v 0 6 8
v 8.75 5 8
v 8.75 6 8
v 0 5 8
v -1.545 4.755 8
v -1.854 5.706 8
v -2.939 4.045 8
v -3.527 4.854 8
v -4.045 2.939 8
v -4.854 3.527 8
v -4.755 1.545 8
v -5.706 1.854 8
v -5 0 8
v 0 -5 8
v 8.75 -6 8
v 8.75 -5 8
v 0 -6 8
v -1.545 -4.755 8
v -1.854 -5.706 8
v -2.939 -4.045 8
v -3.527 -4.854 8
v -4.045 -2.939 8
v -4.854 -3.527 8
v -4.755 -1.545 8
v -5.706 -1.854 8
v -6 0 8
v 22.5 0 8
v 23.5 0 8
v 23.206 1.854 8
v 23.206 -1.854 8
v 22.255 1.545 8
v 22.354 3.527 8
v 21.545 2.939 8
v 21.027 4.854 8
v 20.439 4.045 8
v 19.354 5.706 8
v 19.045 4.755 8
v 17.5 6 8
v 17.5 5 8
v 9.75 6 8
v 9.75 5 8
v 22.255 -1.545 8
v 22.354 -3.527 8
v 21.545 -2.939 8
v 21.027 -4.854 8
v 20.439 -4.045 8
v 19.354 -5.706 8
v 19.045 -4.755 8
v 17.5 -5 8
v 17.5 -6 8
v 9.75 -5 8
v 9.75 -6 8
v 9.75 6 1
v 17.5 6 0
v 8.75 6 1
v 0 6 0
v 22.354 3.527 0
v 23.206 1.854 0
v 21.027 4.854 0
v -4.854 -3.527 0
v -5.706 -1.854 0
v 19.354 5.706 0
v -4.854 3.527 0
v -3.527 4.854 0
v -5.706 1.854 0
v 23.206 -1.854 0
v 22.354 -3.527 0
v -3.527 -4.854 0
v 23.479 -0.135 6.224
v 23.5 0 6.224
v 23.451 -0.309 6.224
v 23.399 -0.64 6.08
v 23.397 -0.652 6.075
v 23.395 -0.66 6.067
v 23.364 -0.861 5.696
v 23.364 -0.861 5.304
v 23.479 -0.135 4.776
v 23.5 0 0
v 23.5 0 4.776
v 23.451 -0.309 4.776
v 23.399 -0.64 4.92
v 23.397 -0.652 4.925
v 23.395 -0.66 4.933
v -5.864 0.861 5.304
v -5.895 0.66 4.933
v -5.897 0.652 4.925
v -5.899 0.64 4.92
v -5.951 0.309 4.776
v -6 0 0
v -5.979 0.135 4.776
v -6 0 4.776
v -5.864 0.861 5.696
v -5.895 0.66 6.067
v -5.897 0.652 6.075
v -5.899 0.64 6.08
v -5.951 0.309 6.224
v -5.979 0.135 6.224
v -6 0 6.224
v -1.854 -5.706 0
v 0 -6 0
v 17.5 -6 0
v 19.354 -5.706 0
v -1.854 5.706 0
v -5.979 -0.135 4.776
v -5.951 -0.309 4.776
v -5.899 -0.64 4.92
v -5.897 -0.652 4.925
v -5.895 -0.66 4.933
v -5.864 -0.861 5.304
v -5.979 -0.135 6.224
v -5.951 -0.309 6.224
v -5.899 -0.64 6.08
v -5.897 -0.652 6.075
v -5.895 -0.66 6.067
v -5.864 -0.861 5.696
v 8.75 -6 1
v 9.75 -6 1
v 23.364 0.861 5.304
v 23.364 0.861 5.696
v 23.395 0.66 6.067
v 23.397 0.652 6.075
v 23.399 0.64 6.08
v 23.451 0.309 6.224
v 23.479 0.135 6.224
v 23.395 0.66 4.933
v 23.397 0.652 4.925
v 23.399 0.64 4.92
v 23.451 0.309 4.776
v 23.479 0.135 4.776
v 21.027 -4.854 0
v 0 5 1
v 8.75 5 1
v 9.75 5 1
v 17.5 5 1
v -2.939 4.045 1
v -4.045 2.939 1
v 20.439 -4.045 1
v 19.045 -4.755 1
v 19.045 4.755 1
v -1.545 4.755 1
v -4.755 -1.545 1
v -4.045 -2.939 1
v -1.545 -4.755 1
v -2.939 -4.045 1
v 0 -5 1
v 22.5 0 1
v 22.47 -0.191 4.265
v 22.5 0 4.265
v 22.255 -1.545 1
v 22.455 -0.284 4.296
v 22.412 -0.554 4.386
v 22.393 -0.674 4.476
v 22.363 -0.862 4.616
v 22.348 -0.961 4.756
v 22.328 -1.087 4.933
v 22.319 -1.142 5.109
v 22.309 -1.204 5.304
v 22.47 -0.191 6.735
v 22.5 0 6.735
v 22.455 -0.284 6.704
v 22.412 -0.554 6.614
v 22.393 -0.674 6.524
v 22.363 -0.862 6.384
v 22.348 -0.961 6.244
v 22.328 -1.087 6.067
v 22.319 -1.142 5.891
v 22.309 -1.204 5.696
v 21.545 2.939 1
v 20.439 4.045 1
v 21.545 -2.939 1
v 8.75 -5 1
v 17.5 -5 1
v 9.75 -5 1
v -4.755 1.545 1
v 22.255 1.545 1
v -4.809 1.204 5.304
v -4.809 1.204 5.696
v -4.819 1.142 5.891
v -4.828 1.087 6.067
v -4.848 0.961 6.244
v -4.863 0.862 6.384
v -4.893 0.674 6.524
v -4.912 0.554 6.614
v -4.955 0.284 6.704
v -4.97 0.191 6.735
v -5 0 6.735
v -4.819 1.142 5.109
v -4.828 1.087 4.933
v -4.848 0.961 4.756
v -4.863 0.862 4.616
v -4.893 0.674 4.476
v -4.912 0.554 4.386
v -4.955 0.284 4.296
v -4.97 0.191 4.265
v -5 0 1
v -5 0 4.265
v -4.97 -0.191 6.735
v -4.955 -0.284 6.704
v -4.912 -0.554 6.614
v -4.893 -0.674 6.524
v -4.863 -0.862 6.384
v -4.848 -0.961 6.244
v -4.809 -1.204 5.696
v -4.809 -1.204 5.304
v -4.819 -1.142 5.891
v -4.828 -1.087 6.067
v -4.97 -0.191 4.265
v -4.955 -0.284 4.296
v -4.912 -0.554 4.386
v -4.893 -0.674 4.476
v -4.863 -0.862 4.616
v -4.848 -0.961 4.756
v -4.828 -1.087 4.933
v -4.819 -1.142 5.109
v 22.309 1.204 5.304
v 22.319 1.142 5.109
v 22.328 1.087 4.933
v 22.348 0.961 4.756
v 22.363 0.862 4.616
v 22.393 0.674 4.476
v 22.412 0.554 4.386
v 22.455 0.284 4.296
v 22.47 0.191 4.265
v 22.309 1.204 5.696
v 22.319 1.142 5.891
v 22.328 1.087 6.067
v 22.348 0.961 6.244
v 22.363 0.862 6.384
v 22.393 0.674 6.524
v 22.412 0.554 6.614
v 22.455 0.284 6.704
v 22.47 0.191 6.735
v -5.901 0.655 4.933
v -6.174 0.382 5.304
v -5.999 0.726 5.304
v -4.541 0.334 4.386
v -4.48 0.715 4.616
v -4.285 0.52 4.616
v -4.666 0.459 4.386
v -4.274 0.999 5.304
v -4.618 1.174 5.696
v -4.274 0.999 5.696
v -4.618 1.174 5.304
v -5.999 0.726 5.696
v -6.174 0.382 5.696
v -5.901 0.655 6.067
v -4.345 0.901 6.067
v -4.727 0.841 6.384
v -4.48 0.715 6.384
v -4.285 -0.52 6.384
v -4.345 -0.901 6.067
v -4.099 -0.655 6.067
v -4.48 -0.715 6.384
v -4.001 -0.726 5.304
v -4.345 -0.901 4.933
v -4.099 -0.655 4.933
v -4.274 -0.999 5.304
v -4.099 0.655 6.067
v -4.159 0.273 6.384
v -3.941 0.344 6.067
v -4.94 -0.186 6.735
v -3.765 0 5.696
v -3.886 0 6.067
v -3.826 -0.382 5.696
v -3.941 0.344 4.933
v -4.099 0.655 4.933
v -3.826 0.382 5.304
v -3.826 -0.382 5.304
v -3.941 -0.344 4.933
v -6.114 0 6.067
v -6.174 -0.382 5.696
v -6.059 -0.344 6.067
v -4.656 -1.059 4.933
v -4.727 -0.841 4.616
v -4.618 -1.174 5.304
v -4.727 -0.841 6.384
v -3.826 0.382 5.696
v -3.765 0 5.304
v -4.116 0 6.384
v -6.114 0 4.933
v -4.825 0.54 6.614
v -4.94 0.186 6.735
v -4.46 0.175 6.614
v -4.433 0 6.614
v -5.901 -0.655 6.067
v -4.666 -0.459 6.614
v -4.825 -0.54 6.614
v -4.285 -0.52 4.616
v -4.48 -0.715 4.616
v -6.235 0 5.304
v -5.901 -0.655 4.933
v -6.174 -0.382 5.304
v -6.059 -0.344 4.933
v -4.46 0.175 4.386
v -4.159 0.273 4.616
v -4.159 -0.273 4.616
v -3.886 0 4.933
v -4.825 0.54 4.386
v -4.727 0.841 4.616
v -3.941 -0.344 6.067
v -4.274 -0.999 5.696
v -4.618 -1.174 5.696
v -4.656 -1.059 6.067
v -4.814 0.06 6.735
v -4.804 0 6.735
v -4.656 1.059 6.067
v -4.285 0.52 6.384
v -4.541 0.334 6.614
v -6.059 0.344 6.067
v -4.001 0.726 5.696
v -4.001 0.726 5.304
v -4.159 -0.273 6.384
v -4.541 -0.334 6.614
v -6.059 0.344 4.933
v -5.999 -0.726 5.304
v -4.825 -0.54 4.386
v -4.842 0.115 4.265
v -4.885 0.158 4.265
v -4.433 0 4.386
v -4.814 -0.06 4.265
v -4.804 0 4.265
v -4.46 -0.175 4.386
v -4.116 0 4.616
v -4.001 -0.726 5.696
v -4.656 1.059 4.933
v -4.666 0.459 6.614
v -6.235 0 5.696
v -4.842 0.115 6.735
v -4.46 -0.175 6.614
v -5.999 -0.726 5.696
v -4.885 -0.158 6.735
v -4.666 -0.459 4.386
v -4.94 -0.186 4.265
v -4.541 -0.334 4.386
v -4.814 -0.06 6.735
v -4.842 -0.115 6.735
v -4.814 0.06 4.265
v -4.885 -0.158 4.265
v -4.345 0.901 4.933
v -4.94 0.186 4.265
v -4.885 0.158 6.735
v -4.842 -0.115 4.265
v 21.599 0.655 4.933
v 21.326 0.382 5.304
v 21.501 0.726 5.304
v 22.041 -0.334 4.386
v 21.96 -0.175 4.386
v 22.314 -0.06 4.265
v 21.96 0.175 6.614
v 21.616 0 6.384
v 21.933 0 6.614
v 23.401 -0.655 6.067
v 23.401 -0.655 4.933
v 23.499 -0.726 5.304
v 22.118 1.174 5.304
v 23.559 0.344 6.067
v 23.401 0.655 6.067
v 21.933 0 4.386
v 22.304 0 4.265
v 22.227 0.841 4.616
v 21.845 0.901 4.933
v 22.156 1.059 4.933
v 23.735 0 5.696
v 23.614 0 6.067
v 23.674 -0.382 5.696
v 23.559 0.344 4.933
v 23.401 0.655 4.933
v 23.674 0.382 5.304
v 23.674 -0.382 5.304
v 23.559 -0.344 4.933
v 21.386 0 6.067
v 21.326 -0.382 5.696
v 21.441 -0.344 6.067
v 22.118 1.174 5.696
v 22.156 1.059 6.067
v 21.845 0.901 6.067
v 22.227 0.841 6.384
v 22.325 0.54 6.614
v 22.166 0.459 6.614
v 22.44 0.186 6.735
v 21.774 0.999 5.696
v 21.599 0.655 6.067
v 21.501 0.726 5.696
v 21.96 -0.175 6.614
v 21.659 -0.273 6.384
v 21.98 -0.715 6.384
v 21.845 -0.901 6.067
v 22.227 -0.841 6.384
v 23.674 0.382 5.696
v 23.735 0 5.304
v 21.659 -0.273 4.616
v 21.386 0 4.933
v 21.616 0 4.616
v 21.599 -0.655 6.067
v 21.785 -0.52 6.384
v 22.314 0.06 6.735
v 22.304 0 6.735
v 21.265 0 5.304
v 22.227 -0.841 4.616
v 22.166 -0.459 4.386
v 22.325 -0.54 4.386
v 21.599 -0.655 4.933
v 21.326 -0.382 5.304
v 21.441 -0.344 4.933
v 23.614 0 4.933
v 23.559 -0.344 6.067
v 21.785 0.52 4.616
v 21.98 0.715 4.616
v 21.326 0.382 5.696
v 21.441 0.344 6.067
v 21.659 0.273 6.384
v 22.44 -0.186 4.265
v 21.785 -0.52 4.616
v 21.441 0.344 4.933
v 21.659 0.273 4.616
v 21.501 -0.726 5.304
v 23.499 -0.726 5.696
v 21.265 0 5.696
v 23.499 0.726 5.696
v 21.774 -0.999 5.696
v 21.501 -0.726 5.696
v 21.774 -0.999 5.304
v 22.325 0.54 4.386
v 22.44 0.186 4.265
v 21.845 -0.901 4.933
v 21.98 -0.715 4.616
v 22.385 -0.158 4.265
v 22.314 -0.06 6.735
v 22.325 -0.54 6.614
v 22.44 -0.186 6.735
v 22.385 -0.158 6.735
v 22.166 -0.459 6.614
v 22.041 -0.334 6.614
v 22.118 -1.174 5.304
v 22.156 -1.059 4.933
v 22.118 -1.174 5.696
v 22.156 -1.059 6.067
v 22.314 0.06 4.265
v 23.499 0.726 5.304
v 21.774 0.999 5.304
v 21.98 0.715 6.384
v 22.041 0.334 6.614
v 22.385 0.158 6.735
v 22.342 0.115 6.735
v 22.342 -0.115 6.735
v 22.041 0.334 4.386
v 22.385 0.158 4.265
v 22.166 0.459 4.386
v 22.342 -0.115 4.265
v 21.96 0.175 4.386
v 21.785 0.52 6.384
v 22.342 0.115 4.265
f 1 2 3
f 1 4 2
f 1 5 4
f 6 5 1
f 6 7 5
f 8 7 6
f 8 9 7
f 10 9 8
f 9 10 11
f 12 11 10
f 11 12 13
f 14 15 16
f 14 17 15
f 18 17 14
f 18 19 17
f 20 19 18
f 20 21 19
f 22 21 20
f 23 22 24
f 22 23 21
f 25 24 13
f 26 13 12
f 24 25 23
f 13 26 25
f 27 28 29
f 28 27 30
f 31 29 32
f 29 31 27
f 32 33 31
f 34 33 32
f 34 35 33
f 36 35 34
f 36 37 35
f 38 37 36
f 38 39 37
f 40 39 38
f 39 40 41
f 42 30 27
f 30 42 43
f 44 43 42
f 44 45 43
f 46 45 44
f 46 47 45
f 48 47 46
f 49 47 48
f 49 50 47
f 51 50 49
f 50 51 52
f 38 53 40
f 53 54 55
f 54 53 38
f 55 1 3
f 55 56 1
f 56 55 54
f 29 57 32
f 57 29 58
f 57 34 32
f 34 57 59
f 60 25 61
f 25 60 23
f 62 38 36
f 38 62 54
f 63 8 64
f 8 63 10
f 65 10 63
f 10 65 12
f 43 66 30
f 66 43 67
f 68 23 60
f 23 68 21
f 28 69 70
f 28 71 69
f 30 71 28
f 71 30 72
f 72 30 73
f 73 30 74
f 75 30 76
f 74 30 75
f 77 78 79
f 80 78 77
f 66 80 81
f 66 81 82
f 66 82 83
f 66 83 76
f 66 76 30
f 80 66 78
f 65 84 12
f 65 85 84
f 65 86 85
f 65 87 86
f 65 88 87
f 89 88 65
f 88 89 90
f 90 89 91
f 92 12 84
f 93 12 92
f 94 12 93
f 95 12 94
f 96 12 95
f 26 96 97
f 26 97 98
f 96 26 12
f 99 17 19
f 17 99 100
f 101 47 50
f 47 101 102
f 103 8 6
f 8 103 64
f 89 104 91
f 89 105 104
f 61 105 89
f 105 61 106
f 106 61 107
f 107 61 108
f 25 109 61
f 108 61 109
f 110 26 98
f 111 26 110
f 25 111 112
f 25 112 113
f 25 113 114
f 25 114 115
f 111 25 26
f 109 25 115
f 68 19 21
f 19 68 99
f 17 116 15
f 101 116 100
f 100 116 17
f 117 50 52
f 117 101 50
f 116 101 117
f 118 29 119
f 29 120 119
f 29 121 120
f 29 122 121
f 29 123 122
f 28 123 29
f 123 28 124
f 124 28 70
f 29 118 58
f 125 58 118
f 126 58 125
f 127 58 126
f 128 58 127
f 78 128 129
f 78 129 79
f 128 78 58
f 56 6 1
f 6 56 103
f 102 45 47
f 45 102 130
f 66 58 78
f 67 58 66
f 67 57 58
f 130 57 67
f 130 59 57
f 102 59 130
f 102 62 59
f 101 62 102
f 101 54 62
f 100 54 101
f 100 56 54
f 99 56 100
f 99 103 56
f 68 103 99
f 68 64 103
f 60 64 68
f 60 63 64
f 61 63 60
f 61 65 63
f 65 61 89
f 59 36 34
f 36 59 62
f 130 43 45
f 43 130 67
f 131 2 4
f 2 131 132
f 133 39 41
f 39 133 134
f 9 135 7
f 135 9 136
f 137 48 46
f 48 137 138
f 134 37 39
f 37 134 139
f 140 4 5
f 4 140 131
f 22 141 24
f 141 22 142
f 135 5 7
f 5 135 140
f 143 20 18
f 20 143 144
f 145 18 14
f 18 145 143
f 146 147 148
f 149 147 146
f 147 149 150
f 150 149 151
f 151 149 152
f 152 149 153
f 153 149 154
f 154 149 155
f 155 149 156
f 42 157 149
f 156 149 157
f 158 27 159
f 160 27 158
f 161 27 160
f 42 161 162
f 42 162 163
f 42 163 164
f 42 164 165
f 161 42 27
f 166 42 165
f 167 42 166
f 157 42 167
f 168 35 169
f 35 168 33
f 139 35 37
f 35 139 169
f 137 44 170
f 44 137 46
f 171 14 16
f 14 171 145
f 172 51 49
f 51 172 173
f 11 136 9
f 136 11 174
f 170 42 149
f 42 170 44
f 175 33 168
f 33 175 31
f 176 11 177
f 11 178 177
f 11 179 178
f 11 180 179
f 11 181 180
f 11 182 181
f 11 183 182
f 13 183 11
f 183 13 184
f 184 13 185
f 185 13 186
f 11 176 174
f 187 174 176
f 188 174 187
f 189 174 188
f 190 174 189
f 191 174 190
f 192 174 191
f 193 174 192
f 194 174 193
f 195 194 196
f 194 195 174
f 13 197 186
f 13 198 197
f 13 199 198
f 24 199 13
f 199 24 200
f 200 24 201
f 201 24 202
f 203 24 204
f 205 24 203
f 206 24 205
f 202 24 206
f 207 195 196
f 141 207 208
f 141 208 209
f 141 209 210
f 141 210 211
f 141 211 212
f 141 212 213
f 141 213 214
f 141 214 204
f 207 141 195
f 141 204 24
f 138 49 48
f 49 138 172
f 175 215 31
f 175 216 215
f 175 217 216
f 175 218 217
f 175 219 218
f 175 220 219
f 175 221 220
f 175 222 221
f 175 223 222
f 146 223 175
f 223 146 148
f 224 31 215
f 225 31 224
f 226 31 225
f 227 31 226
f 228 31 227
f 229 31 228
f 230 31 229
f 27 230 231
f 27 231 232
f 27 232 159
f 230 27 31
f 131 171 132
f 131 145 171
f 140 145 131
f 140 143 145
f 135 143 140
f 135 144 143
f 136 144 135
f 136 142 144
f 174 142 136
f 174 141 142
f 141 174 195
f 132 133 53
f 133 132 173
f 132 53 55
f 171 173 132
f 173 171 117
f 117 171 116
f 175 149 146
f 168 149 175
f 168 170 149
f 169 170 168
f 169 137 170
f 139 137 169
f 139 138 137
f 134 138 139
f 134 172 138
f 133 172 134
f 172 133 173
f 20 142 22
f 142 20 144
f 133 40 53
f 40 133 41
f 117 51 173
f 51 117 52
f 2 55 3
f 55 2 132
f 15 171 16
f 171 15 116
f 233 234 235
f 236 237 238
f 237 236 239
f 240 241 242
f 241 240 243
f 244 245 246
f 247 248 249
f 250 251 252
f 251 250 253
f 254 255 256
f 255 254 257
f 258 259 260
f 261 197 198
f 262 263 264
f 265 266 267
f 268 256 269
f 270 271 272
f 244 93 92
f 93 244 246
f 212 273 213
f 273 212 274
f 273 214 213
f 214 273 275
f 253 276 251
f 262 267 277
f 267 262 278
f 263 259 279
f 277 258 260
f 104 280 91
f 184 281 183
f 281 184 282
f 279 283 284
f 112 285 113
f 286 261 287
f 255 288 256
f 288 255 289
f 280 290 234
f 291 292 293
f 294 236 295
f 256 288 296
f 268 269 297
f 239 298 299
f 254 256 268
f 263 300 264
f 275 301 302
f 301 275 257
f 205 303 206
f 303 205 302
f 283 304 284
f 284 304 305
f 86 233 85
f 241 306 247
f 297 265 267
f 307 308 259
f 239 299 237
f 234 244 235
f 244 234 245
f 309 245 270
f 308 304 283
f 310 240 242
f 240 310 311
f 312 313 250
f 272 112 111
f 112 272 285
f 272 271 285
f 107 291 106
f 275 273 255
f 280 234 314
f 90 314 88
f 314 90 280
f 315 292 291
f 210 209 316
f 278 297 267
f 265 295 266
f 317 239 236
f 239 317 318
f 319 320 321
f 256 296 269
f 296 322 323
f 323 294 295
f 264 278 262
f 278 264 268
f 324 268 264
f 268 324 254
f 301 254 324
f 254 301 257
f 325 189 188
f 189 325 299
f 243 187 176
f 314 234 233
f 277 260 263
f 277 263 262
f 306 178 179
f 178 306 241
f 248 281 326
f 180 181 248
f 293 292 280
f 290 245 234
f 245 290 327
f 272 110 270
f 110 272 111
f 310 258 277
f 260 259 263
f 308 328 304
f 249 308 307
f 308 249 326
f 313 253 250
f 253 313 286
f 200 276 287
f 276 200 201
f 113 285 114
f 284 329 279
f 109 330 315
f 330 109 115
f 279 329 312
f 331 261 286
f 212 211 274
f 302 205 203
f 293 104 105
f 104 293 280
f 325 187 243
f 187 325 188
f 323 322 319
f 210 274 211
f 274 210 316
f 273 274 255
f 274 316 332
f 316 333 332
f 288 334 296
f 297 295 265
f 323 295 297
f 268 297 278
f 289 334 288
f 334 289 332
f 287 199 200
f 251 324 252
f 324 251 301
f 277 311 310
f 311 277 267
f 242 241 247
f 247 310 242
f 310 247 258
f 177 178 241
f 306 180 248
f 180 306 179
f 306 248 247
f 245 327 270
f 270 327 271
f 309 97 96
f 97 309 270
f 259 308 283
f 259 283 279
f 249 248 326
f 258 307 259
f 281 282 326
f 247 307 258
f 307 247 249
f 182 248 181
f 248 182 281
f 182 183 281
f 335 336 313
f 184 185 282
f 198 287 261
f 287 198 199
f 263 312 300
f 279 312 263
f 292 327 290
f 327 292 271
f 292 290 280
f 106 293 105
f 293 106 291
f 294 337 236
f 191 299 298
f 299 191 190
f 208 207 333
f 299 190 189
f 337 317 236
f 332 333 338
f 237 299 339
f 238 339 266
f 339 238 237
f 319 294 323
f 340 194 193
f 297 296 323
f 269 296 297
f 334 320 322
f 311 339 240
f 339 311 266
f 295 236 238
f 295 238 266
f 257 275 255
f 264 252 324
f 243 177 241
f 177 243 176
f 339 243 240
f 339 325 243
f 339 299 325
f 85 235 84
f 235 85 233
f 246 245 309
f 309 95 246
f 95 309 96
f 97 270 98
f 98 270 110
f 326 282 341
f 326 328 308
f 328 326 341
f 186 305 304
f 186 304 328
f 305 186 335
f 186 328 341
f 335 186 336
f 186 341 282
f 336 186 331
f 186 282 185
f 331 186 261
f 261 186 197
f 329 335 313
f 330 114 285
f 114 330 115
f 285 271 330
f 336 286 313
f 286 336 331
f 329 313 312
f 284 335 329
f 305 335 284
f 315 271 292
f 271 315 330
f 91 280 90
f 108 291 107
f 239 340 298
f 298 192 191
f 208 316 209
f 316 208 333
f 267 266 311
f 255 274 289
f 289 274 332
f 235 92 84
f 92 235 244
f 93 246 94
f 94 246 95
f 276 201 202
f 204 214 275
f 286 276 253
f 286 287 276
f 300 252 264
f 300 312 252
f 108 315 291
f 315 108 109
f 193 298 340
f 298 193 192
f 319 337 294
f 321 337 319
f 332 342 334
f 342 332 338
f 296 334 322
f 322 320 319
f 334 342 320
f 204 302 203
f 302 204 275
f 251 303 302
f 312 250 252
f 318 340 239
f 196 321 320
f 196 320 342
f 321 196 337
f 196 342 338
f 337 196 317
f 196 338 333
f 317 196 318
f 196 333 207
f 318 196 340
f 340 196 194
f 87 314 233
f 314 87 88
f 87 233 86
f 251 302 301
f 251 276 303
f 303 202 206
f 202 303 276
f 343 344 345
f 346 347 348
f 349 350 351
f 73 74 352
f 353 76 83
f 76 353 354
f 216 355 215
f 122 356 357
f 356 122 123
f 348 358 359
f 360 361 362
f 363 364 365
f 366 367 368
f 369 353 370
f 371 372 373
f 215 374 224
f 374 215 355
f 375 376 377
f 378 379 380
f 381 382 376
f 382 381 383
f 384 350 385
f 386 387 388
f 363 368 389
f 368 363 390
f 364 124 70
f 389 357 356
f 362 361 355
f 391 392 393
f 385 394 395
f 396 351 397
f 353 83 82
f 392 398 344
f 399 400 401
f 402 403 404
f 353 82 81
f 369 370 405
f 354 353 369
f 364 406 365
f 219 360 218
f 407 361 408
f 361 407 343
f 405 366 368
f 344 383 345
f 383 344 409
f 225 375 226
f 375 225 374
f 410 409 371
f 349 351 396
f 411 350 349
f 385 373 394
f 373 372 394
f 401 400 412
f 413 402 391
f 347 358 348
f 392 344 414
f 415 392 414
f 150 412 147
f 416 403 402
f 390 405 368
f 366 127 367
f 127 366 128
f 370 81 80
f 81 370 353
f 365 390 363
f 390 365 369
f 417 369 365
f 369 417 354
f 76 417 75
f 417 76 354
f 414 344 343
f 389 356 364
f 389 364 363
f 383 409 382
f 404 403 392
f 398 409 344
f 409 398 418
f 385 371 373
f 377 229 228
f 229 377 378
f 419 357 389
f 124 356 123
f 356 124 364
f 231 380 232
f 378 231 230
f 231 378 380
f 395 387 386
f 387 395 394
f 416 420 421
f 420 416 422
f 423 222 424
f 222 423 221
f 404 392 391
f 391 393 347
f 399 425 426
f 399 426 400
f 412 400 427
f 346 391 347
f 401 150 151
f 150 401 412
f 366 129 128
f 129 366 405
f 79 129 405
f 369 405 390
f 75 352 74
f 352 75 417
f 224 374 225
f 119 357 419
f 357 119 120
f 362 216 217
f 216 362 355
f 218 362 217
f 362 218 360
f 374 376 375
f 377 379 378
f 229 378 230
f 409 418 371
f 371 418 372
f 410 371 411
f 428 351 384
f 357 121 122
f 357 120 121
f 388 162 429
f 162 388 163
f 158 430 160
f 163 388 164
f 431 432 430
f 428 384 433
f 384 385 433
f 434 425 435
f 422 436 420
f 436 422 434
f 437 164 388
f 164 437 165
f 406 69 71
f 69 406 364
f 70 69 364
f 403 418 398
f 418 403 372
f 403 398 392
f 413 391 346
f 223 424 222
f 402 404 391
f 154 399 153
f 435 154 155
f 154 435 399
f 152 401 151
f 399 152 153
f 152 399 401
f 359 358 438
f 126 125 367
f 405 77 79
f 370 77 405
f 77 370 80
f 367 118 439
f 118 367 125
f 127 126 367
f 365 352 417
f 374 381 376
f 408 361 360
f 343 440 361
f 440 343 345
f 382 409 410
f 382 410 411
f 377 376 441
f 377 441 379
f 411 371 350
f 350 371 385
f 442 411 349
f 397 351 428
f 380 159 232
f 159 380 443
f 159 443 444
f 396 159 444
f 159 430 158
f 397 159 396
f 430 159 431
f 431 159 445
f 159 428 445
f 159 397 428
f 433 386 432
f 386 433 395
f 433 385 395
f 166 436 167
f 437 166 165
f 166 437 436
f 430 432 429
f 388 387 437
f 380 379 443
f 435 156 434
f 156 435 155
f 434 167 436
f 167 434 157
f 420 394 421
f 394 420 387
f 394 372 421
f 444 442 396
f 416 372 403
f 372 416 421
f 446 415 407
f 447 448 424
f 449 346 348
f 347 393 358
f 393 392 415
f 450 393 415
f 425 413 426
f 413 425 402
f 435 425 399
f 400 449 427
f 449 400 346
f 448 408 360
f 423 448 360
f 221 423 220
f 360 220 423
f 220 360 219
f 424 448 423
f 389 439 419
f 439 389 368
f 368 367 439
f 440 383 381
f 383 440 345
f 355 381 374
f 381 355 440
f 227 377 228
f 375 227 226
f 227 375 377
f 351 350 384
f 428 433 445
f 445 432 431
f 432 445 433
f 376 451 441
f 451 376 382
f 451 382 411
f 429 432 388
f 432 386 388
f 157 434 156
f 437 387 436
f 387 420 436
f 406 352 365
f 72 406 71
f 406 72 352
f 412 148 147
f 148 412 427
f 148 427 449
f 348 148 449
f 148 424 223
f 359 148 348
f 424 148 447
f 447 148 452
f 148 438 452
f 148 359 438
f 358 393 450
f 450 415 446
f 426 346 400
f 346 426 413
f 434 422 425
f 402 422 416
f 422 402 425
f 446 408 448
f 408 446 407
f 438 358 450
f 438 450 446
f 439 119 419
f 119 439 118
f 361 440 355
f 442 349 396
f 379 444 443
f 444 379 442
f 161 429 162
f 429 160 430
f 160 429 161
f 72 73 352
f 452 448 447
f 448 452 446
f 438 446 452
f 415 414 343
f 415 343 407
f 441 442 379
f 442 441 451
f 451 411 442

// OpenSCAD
height=27.5;

width=10;

wall_thickness=1;

hole_distance=4.5;

hole_diameter=2.5;

$fn=20*1;


difference()
{
	hull()
		{
		cylinder(r=width/2+wall_thickness,h=hole_distance+wall_thickness+hole_diameter);
		translate([height-width,0,0])
		cylinder(r=width/2+wall_thickness,h=hole_distance+wall_thickness+hole_diameter);
		}
	translate([0,0,wall_thickness])	
	hull()
		{
		cylinder(r=width/2,h=hole_distance+hole_diameter+0.1);
		translate([height-width,0,0])
		cylinder(r=width/2,h=hole_distance+hole_diameter+0.1);
		}
	translate([(height-width)/2,-(width+wall_thickness*2+0.2)/2,+wall_thickness])
		cube([1,width+wall_thickness*2+0.2,hole_distance*2+0.1]);
}

translate([-width/2,0,hole_distance+wall_thickness])
sphere(r=hole_diameter/2);
translate([height-width/2,0,hole_distance+wall_thickness])
sphere(r=hole_diameter/2);
